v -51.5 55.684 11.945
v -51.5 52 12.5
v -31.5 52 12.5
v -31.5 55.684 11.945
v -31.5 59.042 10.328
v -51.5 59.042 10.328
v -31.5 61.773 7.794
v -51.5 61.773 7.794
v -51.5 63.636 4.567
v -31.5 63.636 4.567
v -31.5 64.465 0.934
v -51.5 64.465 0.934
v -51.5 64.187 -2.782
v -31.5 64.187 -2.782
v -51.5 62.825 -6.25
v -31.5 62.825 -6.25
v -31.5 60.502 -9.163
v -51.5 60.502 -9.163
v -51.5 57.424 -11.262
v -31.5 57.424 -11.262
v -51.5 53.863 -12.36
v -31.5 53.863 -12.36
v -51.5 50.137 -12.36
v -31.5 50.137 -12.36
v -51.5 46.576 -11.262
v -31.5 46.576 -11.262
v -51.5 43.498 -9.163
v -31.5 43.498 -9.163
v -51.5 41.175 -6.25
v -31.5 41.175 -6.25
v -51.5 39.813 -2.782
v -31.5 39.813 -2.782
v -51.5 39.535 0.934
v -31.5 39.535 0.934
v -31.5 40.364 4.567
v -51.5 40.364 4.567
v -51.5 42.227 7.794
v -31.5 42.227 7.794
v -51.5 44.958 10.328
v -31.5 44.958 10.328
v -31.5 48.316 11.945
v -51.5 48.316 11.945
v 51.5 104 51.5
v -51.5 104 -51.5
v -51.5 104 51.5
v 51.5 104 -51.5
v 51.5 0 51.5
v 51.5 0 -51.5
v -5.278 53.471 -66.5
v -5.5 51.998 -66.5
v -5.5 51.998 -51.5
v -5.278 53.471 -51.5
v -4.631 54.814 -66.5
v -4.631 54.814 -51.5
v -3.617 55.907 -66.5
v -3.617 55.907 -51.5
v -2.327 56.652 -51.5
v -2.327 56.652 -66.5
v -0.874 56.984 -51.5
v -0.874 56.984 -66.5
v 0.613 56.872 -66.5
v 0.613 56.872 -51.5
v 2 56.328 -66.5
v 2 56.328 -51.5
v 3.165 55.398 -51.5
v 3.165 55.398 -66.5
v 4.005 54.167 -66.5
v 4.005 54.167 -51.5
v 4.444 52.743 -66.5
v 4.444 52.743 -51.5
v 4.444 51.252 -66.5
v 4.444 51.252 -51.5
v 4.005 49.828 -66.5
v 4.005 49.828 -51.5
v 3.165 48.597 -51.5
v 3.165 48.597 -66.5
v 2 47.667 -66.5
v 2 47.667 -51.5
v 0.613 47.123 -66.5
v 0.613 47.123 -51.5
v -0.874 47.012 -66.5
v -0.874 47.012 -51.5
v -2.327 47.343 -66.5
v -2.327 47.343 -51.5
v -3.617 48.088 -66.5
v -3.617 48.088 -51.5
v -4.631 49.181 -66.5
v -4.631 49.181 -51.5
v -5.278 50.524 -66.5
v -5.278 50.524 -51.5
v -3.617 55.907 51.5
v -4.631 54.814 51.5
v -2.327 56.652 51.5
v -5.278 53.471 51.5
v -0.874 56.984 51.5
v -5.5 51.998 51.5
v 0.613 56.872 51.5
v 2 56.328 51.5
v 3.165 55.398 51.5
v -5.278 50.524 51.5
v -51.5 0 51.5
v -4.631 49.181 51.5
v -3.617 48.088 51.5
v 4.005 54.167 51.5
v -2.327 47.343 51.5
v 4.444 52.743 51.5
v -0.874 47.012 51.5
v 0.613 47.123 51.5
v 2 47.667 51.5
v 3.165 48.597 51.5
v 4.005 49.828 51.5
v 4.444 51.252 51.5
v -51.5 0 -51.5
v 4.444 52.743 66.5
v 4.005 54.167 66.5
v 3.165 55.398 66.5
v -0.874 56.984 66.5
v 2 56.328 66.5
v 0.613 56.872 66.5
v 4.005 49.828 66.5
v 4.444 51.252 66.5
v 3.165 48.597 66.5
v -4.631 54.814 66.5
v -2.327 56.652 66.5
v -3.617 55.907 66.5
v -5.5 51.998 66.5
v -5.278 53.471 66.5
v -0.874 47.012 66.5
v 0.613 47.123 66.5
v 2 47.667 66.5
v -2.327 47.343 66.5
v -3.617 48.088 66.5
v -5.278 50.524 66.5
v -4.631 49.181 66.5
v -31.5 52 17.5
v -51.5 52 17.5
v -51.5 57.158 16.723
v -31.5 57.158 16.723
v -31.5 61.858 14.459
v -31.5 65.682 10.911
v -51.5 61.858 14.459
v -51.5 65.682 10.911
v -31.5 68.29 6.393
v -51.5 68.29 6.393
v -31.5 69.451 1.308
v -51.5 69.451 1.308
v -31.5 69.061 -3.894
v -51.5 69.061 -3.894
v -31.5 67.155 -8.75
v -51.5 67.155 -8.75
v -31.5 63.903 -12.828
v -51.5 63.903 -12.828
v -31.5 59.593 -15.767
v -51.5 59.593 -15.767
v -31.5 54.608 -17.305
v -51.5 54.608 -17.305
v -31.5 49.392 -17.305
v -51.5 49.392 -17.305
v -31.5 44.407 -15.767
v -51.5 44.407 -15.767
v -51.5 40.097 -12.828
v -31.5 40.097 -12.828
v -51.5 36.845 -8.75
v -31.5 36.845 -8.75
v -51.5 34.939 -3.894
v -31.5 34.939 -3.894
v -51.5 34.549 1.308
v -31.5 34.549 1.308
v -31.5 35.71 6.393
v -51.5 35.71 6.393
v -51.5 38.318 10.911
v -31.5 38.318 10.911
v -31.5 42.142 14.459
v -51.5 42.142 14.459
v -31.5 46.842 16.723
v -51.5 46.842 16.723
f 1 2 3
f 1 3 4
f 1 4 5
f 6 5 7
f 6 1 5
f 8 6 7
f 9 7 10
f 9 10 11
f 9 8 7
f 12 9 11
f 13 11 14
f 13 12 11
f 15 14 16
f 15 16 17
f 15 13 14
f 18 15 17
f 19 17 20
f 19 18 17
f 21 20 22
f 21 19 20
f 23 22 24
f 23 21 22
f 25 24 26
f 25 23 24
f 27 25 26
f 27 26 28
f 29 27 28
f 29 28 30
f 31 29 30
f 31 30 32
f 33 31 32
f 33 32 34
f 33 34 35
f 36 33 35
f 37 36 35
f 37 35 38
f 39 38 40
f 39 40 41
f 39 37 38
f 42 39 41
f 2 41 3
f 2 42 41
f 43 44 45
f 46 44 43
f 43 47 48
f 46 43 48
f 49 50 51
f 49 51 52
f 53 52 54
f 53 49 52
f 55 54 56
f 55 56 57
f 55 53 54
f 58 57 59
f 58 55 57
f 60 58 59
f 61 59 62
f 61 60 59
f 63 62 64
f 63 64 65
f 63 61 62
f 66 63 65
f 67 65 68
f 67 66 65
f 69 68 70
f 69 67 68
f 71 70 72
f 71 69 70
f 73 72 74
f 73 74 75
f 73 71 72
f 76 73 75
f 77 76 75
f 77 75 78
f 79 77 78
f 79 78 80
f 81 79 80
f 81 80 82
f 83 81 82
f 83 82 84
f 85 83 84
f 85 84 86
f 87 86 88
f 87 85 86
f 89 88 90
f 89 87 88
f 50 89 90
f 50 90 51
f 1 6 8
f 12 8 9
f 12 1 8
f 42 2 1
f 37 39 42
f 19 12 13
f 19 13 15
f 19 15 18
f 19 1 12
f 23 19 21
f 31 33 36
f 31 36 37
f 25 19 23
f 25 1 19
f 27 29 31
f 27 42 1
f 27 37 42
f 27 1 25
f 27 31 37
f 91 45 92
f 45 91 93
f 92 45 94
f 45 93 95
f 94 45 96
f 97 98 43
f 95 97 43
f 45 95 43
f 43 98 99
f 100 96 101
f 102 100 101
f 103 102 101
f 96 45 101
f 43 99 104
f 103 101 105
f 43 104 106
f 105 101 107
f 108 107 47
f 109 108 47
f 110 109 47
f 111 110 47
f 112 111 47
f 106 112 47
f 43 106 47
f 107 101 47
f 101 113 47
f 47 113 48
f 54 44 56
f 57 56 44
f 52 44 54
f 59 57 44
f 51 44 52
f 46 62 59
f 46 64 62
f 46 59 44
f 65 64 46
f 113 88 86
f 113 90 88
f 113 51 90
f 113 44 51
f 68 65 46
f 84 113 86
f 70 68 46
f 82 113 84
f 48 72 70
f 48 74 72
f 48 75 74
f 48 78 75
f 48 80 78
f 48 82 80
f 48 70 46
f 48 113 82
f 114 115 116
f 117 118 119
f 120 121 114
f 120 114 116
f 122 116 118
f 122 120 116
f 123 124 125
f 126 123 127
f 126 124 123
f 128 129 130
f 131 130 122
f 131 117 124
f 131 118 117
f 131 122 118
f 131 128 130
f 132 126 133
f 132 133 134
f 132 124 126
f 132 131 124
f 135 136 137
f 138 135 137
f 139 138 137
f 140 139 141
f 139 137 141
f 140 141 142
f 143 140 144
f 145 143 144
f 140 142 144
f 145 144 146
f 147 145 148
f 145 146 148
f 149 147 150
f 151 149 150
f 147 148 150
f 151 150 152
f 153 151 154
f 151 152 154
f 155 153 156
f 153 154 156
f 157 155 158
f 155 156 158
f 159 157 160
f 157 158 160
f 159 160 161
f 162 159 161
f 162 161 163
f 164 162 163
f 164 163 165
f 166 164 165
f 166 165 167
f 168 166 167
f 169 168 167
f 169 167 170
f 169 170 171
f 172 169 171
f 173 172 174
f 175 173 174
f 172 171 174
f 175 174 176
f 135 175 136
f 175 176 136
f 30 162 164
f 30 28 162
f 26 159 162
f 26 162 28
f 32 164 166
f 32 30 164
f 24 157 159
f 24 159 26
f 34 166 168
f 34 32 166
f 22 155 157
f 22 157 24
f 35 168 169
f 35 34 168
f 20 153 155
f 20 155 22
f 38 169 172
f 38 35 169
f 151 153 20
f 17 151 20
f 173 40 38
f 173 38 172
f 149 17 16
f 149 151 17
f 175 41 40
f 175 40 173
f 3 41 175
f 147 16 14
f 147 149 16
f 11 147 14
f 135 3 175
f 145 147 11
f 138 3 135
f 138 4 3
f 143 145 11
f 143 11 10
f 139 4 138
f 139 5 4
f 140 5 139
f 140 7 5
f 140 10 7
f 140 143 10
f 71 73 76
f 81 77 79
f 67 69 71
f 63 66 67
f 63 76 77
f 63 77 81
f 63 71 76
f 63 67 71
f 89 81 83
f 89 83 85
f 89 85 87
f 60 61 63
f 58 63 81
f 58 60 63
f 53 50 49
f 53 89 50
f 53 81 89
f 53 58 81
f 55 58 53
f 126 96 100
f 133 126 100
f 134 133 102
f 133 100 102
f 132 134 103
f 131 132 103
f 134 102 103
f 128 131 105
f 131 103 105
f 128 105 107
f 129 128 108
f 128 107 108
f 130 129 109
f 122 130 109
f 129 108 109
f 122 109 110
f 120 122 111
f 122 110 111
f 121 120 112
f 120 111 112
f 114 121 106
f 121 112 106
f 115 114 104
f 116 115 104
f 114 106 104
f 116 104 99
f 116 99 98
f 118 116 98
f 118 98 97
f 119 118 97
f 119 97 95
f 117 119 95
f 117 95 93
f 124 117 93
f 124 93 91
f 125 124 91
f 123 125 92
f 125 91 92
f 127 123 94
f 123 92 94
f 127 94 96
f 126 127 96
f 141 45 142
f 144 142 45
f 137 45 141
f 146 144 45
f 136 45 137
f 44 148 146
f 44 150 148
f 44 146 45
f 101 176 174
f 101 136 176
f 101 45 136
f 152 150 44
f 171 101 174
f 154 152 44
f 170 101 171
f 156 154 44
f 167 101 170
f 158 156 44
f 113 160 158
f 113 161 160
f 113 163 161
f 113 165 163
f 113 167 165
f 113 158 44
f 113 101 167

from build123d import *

# Parameters (mm, degrees)
SKETCH1_W           = 103
SKETCH1_H           = 103
BOSS_EXTRUDE1_DEPTH = 104
SKETCH2_R           = 5
BOSS_EXTRUDE2_DEPTH = 15
BOSS_EXTRUDE3_START = 15
SKETCH3_R           = 5
BOSS_EXTRUDE3_DEPTH = 15
SKETCH4_R           = 17.5
SKETCH4_R_2         = 12.5
CUT_EXTRUDE1_DEPTH  = 20


with BuildPart() as part:
    # Sketch1 → Boss-Extrude1 (new body)
    with BuildSketch(Plane(origin=(0, 0, 0), x_dir=(1, 0, 0), z_dir=(0, 1, 0))):
        Rectangle(SKETCH1_W, SKETCH1_H)
    extrude(amount=BOSS_EXTRUDE1_DEPTH)

    # Sketch2 → Boss-Extrude2 (add)
    with BuildSketch(Plane.XY.offset(51.5)):
        with Locations(Location((-0.5, 51.997596098, 0), (0, 0, 180))):
            Circle(SKETCH2_R)
    extrude(amount=BOSS_EXTRUDE2_DEPTH)

    # Sketch3 → Boss-Extrude3 (add)
    with BuildSketch(Plane(origin=(0, 0, -51.5), x_dir=(-1, 0, 0), z_dir=(0, 0, -1)).offset(BOSS_EXTRUDE3_START)):
        with Locations((0.5, 51.997596098)):
            Circle(SKETCH3_R)
    extrude(amount=-BOSS_EXTRUDE3_DEPTH)

    # Sketch4 → Cut-Extrude1 (cut)
    with BuildSketch(Plane.ZY.offset(51.5)):
        with Locations((0, 52)):
            Circle(SKETCH4_R)
        with Locations((0, 52)):
            Circle(SKETCH4_R_2, mode=Mode.SUBTRACT)
    extrude(amount=-CUT_EXTRUDE1_DEPTH, mode=Mode.SUBTRACT)


solid = part.part
